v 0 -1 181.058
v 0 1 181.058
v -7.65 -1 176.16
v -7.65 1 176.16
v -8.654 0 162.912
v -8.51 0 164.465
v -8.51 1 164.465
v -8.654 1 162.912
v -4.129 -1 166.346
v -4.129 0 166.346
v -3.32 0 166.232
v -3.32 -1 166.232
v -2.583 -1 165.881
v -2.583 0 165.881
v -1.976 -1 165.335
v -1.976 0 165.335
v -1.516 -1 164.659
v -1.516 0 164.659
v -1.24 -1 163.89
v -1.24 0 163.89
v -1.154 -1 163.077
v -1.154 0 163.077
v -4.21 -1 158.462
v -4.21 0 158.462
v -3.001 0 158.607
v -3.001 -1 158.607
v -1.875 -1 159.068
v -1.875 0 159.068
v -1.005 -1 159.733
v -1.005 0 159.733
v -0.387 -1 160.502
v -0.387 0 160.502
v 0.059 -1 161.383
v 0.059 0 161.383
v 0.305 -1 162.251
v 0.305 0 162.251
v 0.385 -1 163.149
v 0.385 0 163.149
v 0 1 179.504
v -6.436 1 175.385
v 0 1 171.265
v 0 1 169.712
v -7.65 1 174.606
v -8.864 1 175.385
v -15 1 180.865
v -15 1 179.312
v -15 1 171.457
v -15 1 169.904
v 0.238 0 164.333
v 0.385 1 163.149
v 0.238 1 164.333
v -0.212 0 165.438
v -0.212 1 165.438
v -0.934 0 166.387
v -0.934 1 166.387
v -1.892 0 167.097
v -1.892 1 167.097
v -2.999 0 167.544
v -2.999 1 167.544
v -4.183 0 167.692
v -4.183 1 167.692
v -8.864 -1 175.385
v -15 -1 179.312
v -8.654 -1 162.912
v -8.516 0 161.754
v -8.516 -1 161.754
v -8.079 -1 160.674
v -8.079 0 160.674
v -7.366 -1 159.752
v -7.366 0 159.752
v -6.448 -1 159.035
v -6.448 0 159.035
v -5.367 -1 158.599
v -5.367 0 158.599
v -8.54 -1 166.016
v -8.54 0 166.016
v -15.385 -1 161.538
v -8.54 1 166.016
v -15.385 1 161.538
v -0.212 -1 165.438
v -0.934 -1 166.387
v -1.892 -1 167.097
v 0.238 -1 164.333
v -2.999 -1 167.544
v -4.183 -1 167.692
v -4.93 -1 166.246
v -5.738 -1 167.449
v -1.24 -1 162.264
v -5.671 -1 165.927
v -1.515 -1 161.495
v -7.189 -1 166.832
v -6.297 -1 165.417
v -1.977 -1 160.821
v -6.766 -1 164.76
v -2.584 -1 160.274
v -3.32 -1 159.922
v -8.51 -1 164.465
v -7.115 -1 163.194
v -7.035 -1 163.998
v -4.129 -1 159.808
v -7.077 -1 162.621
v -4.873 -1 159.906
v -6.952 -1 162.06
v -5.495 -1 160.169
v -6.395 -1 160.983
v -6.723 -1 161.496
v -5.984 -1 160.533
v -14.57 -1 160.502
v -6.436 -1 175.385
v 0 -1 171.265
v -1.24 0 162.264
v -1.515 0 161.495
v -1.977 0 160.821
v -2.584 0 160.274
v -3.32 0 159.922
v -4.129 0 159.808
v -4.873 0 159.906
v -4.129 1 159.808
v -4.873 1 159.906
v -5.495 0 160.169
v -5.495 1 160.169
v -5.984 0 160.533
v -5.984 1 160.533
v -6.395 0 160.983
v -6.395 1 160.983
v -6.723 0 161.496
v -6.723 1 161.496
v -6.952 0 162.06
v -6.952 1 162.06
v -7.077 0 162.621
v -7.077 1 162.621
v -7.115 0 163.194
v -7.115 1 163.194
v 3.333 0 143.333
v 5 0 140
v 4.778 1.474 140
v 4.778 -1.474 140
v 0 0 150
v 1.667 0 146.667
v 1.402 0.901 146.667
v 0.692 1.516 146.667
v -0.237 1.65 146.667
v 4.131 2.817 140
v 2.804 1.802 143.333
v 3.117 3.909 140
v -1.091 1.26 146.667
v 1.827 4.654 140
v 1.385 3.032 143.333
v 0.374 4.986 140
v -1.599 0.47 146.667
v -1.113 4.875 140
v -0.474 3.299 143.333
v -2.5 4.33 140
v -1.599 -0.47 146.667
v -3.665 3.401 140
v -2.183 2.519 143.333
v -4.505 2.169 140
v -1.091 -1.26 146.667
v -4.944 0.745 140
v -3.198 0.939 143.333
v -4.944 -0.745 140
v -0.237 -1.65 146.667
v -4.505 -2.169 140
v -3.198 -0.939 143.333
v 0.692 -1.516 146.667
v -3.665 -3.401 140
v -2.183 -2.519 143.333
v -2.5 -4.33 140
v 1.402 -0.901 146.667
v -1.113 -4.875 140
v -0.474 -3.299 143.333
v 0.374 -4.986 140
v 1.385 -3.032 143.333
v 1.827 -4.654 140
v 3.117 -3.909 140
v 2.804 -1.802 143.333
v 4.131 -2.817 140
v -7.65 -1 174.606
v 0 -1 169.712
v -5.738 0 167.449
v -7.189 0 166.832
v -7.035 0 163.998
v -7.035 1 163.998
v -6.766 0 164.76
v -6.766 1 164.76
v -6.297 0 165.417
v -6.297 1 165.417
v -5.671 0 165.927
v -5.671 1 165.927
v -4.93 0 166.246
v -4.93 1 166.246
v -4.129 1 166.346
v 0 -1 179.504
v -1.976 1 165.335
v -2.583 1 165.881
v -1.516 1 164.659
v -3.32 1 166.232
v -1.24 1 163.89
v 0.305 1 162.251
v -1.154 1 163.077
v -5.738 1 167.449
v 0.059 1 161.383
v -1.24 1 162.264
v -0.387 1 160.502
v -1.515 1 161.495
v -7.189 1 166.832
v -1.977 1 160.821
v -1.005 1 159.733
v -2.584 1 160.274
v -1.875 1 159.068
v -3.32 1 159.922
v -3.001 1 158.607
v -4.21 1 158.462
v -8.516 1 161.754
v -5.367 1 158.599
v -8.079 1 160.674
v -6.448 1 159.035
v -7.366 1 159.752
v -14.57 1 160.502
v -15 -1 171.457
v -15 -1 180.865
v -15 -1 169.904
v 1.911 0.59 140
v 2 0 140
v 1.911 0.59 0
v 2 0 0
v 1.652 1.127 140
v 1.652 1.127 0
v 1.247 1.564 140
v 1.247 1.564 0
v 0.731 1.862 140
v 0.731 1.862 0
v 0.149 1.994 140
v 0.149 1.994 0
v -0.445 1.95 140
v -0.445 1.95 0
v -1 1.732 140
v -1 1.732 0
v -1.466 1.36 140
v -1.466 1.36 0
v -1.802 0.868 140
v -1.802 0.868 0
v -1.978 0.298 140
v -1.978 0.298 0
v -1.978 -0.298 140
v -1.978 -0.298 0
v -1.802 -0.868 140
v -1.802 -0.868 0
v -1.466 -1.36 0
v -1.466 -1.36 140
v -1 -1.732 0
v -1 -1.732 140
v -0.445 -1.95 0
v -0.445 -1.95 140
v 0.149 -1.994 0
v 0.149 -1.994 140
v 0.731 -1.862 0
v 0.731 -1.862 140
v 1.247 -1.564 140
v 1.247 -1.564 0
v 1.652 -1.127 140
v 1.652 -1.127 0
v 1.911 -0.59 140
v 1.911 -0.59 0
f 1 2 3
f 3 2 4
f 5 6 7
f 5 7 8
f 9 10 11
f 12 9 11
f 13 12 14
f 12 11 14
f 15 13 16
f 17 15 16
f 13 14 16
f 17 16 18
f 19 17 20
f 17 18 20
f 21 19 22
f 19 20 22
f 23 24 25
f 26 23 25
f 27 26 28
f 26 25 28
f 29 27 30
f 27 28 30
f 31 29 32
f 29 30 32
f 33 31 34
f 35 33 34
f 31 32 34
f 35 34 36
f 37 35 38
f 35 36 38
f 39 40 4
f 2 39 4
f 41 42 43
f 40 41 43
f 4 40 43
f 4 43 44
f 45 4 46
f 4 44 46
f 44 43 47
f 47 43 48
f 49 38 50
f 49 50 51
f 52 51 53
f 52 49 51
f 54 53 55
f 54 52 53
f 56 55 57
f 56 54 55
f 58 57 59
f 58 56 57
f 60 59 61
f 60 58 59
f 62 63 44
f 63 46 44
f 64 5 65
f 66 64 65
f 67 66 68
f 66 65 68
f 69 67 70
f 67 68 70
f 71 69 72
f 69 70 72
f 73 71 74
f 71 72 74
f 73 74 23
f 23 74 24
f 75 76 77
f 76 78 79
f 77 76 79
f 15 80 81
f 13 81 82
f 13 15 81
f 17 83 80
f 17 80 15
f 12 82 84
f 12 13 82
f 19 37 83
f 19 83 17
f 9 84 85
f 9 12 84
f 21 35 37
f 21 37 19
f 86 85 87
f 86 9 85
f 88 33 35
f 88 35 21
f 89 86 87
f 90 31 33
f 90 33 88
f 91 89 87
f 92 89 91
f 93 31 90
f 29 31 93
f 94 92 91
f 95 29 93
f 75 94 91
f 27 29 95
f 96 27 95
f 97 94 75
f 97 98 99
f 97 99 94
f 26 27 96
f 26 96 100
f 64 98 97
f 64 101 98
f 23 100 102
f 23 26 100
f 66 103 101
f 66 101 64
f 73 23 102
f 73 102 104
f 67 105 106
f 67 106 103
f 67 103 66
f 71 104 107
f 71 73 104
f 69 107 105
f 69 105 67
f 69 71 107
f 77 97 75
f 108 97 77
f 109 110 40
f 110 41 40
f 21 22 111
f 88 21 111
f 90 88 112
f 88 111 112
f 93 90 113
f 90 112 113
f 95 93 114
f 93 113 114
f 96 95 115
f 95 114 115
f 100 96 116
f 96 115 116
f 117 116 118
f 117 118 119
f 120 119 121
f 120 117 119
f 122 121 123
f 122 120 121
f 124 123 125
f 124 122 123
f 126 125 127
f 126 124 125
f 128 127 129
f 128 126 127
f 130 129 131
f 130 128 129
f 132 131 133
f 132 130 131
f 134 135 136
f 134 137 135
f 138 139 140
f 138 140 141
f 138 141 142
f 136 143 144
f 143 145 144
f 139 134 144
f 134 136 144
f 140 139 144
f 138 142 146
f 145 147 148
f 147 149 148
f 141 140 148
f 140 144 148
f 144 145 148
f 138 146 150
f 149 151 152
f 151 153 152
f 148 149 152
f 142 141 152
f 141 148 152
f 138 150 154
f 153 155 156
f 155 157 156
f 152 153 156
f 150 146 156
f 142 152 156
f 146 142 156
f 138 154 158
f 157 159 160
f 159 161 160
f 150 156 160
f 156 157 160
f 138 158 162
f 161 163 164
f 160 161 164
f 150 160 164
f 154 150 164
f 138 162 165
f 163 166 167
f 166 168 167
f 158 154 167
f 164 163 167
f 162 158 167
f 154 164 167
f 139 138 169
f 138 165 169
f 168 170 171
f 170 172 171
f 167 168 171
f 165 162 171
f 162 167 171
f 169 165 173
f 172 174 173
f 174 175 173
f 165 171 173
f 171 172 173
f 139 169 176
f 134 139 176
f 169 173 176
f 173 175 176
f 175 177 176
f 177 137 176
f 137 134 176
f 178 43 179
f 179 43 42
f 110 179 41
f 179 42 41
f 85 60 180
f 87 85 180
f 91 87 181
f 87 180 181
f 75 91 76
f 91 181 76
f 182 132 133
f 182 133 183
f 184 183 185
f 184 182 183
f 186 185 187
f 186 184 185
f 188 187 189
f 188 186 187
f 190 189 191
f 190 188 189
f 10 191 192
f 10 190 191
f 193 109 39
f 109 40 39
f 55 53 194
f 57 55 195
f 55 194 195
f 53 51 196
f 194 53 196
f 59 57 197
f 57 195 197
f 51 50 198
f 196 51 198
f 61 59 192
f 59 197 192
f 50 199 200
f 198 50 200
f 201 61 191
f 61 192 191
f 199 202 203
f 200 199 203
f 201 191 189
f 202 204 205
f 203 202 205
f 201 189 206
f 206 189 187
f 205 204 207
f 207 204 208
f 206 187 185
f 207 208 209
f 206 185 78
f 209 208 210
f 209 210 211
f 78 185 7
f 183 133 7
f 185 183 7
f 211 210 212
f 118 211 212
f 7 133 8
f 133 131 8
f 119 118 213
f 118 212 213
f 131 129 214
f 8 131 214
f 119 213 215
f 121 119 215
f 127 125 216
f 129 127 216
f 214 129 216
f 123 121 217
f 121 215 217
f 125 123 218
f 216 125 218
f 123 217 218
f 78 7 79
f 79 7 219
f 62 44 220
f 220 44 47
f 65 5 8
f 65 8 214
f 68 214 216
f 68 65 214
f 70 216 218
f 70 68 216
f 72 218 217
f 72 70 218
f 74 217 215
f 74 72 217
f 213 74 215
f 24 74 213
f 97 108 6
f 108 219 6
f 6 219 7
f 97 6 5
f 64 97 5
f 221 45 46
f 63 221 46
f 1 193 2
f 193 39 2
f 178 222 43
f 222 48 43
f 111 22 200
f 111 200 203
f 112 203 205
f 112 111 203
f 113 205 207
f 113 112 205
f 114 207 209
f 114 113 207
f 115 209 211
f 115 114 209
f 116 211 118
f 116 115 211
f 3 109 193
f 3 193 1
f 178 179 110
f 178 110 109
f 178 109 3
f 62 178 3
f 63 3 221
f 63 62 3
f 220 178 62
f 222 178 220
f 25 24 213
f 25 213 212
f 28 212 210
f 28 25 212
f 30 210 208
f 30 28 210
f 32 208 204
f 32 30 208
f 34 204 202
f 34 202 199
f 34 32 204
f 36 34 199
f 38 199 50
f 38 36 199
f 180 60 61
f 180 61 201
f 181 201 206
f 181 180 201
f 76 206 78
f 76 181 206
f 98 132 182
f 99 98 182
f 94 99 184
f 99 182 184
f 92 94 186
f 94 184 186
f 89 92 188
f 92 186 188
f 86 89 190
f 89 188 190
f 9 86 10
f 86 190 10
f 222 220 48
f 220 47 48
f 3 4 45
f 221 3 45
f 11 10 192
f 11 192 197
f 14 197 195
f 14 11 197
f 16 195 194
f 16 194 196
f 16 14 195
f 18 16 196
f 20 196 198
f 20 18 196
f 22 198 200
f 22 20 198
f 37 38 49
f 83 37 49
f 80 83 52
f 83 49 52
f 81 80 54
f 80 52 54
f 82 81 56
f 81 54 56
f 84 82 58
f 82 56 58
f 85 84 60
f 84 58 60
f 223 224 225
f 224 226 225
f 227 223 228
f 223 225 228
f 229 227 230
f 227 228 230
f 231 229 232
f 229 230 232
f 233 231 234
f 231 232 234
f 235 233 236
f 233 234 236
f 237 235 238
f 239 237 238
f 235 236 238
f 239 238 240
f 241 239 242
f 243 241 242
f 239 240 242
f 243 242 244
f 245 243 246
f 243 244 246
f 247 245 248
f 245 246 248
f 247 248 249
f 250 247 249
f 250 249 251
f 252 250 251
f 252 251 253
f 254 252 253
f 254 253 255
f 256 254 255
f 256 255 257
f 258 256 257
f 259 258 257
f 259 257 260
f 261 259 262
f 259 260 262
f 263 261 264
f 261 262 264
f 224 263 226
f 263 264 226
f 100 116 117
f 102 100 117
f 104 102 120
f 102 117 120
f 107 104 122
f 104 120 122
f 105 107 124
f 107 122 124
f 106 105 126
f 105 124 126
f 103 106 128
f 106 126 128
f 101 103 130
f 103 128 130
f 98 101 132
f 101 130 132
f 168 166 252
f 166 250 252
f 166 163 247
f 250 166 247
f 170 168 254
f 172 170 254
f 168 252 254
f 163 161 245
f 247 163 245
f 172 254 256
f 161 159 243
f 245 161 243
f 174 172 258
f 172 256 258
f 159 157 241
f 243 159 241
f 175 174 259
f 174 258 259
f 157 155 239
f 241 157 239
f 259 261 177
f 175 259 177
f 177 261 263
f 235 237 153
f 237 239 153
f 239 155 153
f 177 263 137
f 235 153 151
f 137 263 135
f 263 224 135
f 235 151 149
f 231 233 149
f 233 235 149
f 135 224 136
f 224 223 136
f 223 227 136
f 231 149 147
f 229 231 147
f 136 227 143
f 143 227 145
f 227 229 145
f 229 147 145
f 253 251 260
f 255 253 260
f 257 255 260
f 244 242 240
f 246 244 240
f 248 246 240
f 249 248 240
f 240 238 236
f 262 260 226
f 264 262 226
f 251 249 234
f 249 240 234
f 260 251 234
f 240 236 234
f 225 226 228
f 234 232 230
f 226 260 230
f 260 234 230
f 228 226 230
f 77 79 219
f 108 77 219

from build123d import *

# Parameters (mm, degrees)
BOSS_EXTRUDE1_DEPTH        = 1
BOSS_EXTRUDE1_DEPTH_BACK   = 1
BOSS_EXTRUDE1_2_DEPTH      = 1
BOSS_EXTRUDE1_2_DEPTH_BACK = 1


with BuildPart() as part:
    # Sketch2 → Revolve1 (revolve)
    with BuildSketch(Plane(origin=(0, 0, 0), x_dir=(1, 0, 0), z_dir=(0, 1, 0))):
        Polygon((0, -150), (5, -140), (2, -140), (2, 0), (0, 0), align=None)
    revolve(axis=Axis((0, 0, -41.949952025), (0, 0, 1)))


with BuildPart() as body_2:
    # Sketch3 → Boss-Extrude1 (new, two sides: drawn at the far end of the back side and taken through both)
    with BuildSketch(Plane(origin=(0, 0, 0), x_dir=(1, 0, 0), z_dir=(0, 1, 0)).offset(-BOSS_EXTRUDE1_DEPTH_BACK)):
        with BuildLine():
            Line((-15.384615385, -161.538461538), (-14.5703125, -160.501802885))
            Line((-14.5703125, -160.501802885), (-8.509615385, -164.465144231))
            add(Edge.make_bspline(
                [(-8.509615385, -164.465144231), (-8.551674787, -164.201271615), (-8.633716408, -163.686558243), (-8.64725046, -163.165561535), (-8.653846154, -162.911658654)],
                knots=[0, 0, 0, 0, 1.025318673, 2, 2, 2, 2], degree=3))
            add(Edge.make_bspline(
                [(-8.653846154, -162.911658654), (-8.649748532, -162.759205098), (-8.641682487, -162.45910481), (-8.579608839, -162.018504233), (-8.481786938, -161.595123063), (-8.339191529, -161.190716213), (-8.157038681, -160.803831781), (-7.93872886, -160.432250931), (-7.67299167, -160.082953357), (-7.376136314, -159.751460804), (-7.047369878, -159.450441004), (-6.698432357, -159.184140459), (-6.329351346, -158.959227404), (-5.940209844, -158.780037923), (-5.534053996, -158.636833796), (-5.109299766, -158.534889887), (-4.665230263, -158.473946284), (-4.363171943, -158.465718118), (-4.209735577, -158.461538462)],
                knots=[0, 0, 0, 0, 1.043709831, 2.054511743, 3.041122595, 4.01515914, 4.98481438, 5.965901842, 6.960491961, 7.985277438, 9.0096037, 10.00832444, 10.987059228, 11.962929573, 12.936966118, 13.931840027, 14.949438142, 16, 16, 16, 16], degree=3))
            add(Edge.make_bspline(
                [(-4.209735577, -158.461538462), (-3.999814704, -158.46762266), (-3.586740106, -158.479594923), (-2.985237872, -158.599394361), (-2.412540694, -158.784161413), (-1.878558323, -159.052483411), (-1.379592346, -159.379452551), (-0.938932231, -159.783085697), (-0.545933647, -160.243356809), (-0.217440639, -160.764070475), (0.050867747, -161.324382277), (0.243573381, -161.913037725), (0.362217491, -162.524295864), (0.377091411, -162.939172899), (0.384615385, -163.149038462)],
                knots=[0, 0, 0, 0, 1.031403119, 2.029557249, 3.004870281, 3.983165322, 4.960181699, 5.929903783, 6.912123683, 7.928973898, 8.949315281, 9.960468141, 10.968302741, 12, 12, 12, 12], degree=3))
            add(Edge.make_bspline(
                [(0.384615385, -163.149038462), (0.378084543, -163.35088996), (0.36514809, -163.750722436), (0.249307568, -164.33873873), (0.062885284, -164.904751258), (-0.199330062, -165.44149446), (-0.524946662, -165.939531208), (-0.91421359, -166.388660218), (-1.367671637, -166.776844482), (-1.87540114, -167.102802425), (-2.420231006, -167.362427857), (-2.98931297, -167.555305594), (-3.580257904, -167.66856415), (-3.980898774, -167.684354472), (-4.182692308, -167.692307692)],
                knots=[0, 0, 0, 0, 1.012172929, 2.004937354, 2.995255351, 3.995689452, 4.993936421, 5.973737378, 6.968231049, 7.979117505, 8.993136101, 9.989812463, 10.987515067, 12, 12, 12, 12], degree=3))
            add(Edge.make_bspline(
                [(-4.182692308, -167.692307692), (-4.337169093, -167.687244357), (-4.652581173, -167.676905992), (-5.13028415, -167.604720034), (-5.6190745, -167.488728056), (-6.03373533, -167.358827), (-6.373427567, -167.221574386), (-6.647299669, -167.107349216), (-6.92913284, -166.965174947), (-7.22859128, -166.813574742), (-7.53795742, -166.638902447), (-7.862401718, -166.448978235), (-8.196764265, -166.23855116), (-8.423667959, -166.091036177), (-8.539663462, -166.015625)],
                knots=[0, 0, 0, 0, 1.173818275, 2.396712641, 3.66331629, 4.989737886, 5.693666774, 6.447286557, 7.243889047, 8.091586357, 8.998013824, 9.943181721, 10.948533338, 12, 12, 12, 12], degree=3))
            Line((-8.539663462, -166.015625), (-15.384615385, -161.538461538))
        make_face()
        with BuildLine():
            add(Edge.make_bspline(
                [(-7.115384615, -163.194110577), (-7.112082335, -163.308388473), (-7.105632021, -163.531606401), (-7.067359224, -163.858911035), (-6.997698373, -164.169688556), (-6.901107529, -164.464029169), (-6.782022326, -164.743748653), (-6.629225554, -165.003303742), (-6.451252186, -165.248035491), (-6.248424191, -165.474033728), (-6.026504548, -165.678987203), (-5.788770456, -165.855474623), (-5.54099726, -166.007714295), (-5.281102705, -166.131493304), (-5.009189275, -166.2278794), (-4.726506739, -166.29760046), (-4.431159723, -166.336402255), (-4.230877567, -166.342857532), (-4.128605769, -166.346153846)],
                knots=[0, 0, 0, 0, 1.129656352, 2.206547016, 3.251334079, 4.271920891, 5.265058649, 6.249872215, 7.241923875, 8.251504132, 9.246416584, 10.222533834, 11.173322129, 12.116503788, 13.062124155, 14.020151864, 14.989013135, 16, 16, 16, 16], degree=3))
            add(Edge.make_bspline(
                [(-4.128605769, -166.346153846), (-4.027266421, -166.343374379), (-3.827564804, -166.337897099), (-3.534423223, -166.291263565), (-3.252971083, -166.216724728), (-2.984266134, -166.109048351), (-2.723149948, -165.978200106), (-2.47777361, -165.81024631), (-2.240188862, -165.61748415), (-2.021434681, -165.392416719), (-1.818352216, -165.14902973), (-1.640109433, -164.889544686), (-1.489386675, -164.617868563), (-1.364496219, -164.334783811), (-1.272559029, -164.036791143), (-1.202176111, -163.728729206), (-1.16369681, -163.406409539), (-1.157172802, -163.188193395), (-1.153846154, -163.076923077)],
                knots=[0, 0, 0, 0, 0.989367052, 1.949669134, 2.891858276, 3.827522767, 4.772653562, 5.738670152, 6.725809442, 7.756636004, 8.798867547, 9.819240912, 10.826537776, 11.829883227, 12.835515726, 13.868058748, 14.912904531, 16, 16, 16, 16], degree=3))
            add(Edge.make_bspline(
                [(-1.153846154, -163.076923077), (-1.157173061, -162.965652941), (-1.163697577, -162.747437155), (-1.202173196, -162.425114893), (-1.272569713, -162.117062539), (-1.364457508, -161.819035065), (-1.489531157, -161.5360794), (-1.639166208, -161.264640752), (-1.819445103, -161.00760987), (-2.021085993, -160.76406449), (-2.241438867, -160.539932405), (-2.475632853, -160.342636683), (-2.725113333, -160.179930127), (-2.983239431, -160.043893841), (-3.253131579, -159.937409713), (-3.534379419, -159.862503907), (-3.827576232, -159.815969582), (-4.027270268, -159.810478684), (-4.128605769, -159.807692308)],
                knots=[0, 0, 0, 0, 1.087281468, 2.132306021, 3.165025708, 4.170830268, 5.174347389, 6.181816599, 7.194310624, 8.23672049, 9.267723423, 10.261267456, 11.222032883, 12.171822355, 13.107646935, 14.049997283, 15.01046367, 16, 16, 16, 16], degree=3))
            add(Edge.make_bspline(
                [(-4.128605769, -159.807692308), (-4.231010988, -159.810050706), (-4.431999129, -159.814679475), (-4.726374626, -159.867033544), (-5.010625546, -159.939643703), (-5.282965192, -160.049285317), (-5.542319679, -160.191727449), (-5.78999599, -160.365228545), (-6.027905239, -160.565936502), (-6.248858458, -160.797795021), (-6.451032293, -161.05013644), (-6.628980787, -161.318654893), (-6.78087835, -161.598454103), (-6.900737553, -161.893475451), (-6.997297489, -162.19974945), (-7.067110856, -162.519390965), (-7.105532253, -162.852627334), (-7.112058665, -163.078832996), (-7.115384615, -163.194110577)],
                knots=[0, 0, 0, 0, 0.978259475, 1.920005202, 2.851759169, 3.7803069, 4.719124913, 5.675758531, 6.668034766, 7.691045932, 8.733780038, 9.756656648, 10.768121246, 11.773215211, 12.79725739, 13.836288844, 14.897342417, 16, 16, 16, 16], degree=3))
        make_face(mode=Mode.SUBTRACT)
    extrude(amount=BOSS_EXTRUDE1_DEPTH + BOSS_EXTRUDE1_DEPTH_BACK)


with BuildPart() as body_3:
    # Sketch3 → Boss-Extrude1 2 (new, two sides: drawn at the far end of the back side and taken through both)
    with BuildSketch(Plane(origin=(0, 0, 0), x_dir=(1, 0, 0), z_dir=(0, 1, 0)).offset(-BOSS_EXTRUDE1_2_DEPTH_BACK)):
        Polygon((-15, -180.865384615), (-15, -179.311899038), (-8.864182692, -175.384615385), (-15, -171.457331731), (-15, -169.903846154), (-7.650240385, -174.606370192), (0, -169.711538462), (0, -171.265024038), (-6.436298077, -175.384615385), (0, -179.504206731), (0, -181.057692308), (-7.650240385, -176.159855769), align=None)
    extrude(amount=BOSS_EXTRUDE1_2_DEPTH + BOSS_EXTRUDE1_2_DEPTH_BACK)


solid = Compound([part.part, body_2.part, body_3.part])
